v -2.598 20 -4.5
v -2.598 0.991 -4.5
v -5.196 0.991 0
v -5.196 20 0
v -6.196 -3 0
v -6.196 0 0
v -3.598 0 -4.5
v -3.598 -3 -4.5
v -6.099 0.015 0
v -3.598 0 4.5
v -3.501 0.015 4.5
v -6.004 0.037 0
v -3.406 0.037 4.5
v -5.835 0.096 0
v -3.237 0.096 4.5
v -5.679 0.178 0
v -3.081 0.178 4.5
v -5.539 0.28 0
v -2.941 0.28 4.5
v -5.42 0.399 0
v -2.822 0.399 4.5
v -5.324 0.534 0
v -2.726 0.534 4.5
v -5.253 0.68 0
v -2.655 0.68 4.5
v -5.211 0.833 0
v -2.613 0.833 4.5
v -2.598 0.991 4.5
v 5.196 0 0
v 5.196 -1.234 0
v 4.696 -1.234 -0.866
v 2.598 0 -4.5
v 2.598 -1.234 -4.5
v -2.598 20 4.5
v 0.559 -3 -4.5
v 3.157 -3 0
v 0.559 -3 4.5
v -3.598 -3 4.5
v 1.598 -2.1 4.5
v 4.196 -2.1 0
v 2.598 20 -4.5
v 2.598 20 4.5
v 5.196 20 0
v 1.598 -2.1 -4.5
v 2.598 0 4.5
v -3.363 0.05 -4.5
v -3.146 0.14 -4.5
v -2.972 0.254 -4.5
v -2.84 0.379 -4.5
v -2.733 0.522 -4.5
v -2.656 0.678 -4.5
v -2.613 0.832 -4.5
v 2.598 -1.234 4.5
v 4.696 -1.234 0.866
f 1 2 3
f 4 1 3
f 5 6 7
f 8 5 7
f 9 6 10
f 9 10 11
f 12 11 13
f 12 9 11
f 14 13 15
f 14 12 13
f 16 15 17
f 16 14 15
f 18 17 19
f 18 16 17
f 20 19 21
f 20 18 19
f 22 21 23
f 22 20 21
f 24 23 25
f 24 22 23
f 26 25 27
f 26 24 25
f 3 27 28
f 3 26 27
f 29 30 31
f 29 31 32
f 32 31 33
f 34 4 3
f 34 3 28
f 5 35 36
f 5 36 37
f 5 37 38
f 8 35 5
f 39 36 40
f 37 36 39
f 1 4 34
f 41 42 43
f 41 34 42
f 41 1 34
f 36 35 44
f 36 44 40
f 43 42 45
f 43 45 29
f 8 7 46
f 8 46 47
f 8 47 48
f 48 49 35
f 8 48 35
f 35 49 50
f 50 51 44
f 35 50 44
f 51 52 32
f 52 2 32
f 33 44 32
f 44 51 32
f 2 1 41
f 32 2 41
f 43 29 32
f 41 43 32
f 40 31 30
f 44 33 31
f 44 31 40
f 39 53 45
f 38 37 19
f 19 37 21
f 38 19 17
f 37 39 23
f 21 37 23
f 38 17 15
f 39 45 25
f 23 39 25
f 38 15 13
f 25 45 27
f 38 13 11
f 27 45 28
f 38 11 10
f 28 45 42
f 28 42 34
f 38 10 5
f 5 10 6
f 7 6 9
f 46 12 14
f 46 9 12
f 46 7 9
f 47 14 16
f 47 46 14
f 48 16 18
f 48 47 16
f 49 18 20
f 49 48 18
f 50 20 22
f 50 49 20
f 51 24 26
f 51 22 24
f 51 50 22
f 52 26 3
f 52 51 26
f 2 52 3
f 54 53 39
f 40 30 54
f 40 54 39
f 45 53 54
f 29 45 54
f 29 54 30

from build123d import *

# Parameters (mm, degrees)
EXTRUDE_1_DEPTH = 20
EXTRUDE_2_DEPTH = 3
CHAMFER_1_SIZE  = 2.1
CHAMFER_2_SIZE  = 0.9
FILLET_2_R      = 1


# Some blends are built 0.0001 mm under size
with BuildPart() as part:
    # 草图1 → 凸台-拉伸1 (new body)
    with BuildSketch(Plane(origin=(0, 0, 0), x_dir=(1, 0, 0), z_dir=(0, 1, 0))):
        Polygon((2.598076211, -4.5), (5.196152423, 0), (2.598076211, 4.5), (-2.598076211, 4.5), (-5.196152423, 0), (-2.598076211, -4.5), align=None)
    extrude(amount=EXTRUDE_1_DEPTH)

    # 草图2 → 凸台-拉伸2 (add)
    with BuildSketch(Plane(origin=(0, 0, 0), x_dir=(-1, 0, 0), z_dir=(0, -1, 0))):
        Polygon((6.196152423, 0), (3.598076211, 4.5), (-1.598076211, 4.5), (-4.196152423, 0), (-1.598076211, -4.5), (3.598076211, -4.5), align=None)
    extrude(amount=EXTRUDE_2_DEPTH)

    # 倒角1
    # the kernel refuses this chamfer: 2.1 mm, written as the material it adds along each edge
    with BuildSketch(Plane(origin=(-1.102190926, 0, -9.176999876), x_dir=(0.8656979742248804, 0.027495876610586372, -0.49981095845564816), z_dir=(0.49999999999999983, 0, 0.8660254037844388))) as chamfer_1_piece_1_section:
        Polygon((CHAMFER_1_SIZE * 0.999621916911, -CHAMFER_1_SIZE * 0.0274958766106), (-CHAMFER_1_SIZE * 0.0274958766106, -CHAMFER_1_SIZE * 0.999621916911), (0, 0), align=None)
    chamfer_1_piece_1 = extrude(amount=15.997220972, mode=Mode.PRIVATE)
    chamfer_1_piece_1 = split(chamfer_1_piece_1, bisect_by=Plane(origin=(3.647114317, -0.87342855, -2.683012702), z_dir=(-0.8660254037844421, 0, 0.49999999999999406)), keep=Keep.TOP, mode=Mode.PRIVATE)
    chamfer_1_piece_1 = split(chamfer_1_piece_1, bisect_by=Plane(origin=(3.19992905, -0.87342855, -4.5), z_dir=(0, 0, 1)), keep=Keep.TOP, mode=Mode.PRIVATE)
    chamfer_1_piece_1 = split(chamfer_1_piece_1, bisect_by=Plane(origin=(4.997078842, -0.87342855, -1.387245251), z_dir=(-0.8660254037844387, 0, -0.5000000000000003)), keep=Keep.TOP, mode=Mode.PRIVATE)
    add(chamfer_1_piece_1)
    with BuildSketch(Plane(origin=(6.89641956, 0, -4.676999876), x_dir=(0.8656979742248802, 0.027495876610586358, 0.49981095845564866), z_dir=(-0.5000000000000003, 0, 0.8660254037844386))) as chamfer_1_piece_2_section:
        Polygon((CHAMFER_1_SIZE * 0.999621916911, -CHAMFER_1_SIZE * 0.0274958766106), (-CHAMFER_1_SIZE * 0.0274958766106, -CHAMFER_1_SIZE * 0.999621916911), (0, 0), align=None)
    chamfer_1_piece_2 = extrude(amount=15.997220972, mode=Mode.PRIVATE)
    chamfer_1_piece_2 = split(chamfer_1_piece_2, bisect_by=Plane(origin=(3.647114317, -0.87342855, 2.683012702), z_dir=(-0.8660254037844353, 0, -0.500000000000006)), keep=Keep.TOP, mode=Mode.PRIVATE)
    chamfer_1_piece_2 = split(chamfer_1_piece_2, bisect_by=Plane(origin=(3.19992905, -0.87342855, 4.5), z_dir=(0, 0, -1)), keep=Keep.TOP, mode=Mode.PRIVATE)
    chamfer_1_piece_2 = split(chamfer_1_piece_2, bisect_by=Plane(origin=(4.997078842, -0.87342855, 1.387245251), z_dir=(-0.8660254037844388, 0, 0.49999999999999983)), keep=Keep.TOP, mode=Mode.PRIVATE)
    add(chamfer_1_piece_2)
    with BuildSketch(Plane(origin=(6.89641956, 0, -4.676999876), x_dir=(0.8656979742248802, 0.027495876610586358, 0.49981095845564866), z_dir=(-0.5000000000000003, 0, 0.8660254037844386))) as chamfer_1_piece_3a_section:
        Polygon((CHAMFER_1_SIZE * 0.999621916911, -CHAMFER_1_SIZE * 0.0274958766106), (-CHAMFER_1_SIZE * 0.0274958766106, -CHAMFER_1_SIZE * 0.999621916911), (0, 0), align=None)
    chamfer_1_piece_3a = extrude(amount=15.997220972, mode=Mode.PRIVATE)
    chamfer_1_piece_3a = split(chamfer_1_piece_3a, bisect_by=Plane(origin=(5.090413844, -0.863604647, 0.183144591), z_dir=(-0.8660254037844353, 0, -0.500000000000006)), keep=Keep.TOP, mode=Mode.PRIVATE)
    chamfer_1_piece_3a = split(chamfer_1_piece_3a, bisect_by=Plane(origin=(5.032629581, -0.863604647, -0.28322987), z_dir=(-0.8660254037844421, 0, 0.49999999999999406)), keep=Keep.TOP, mode=Mode.PRIVATE)
    chamfer_1_piece_3a = split(chamfer_1_piece_3a, bisect_by=Plane(origin=(4.282629581, -0.863604647, 0.149782832), z_dir=(0.8660254037844388, 0, -0.49999999999999983)), keep=Keep.TOP, mode=Mode.PRIVATE)
    with BuildSketch(Plane(origin=(-1.102190926, 0, -9.176999876), x_dir=(0.8656979742248804, 0.027495876610586372, -0.49981095845564816), z_dir=(0.49999999999999983, 0, 0.8660254037844388))) as chamfer_1_piece_3b_section:
        Polygon((CHAMFER_1_SIZE * 0.999621916911, -CHAMFER_1_SIZE * 0.0274958766106), (-CHAMFER_1_SIZE * 0.0274958766106, -CHAMFER_1_SIZE * 0.999621916911), (0, 0), align=None)
    chamfer_1_piece_3b = extrude(amount=15.997220972, mode=Mode.PRIVATE)
    chamfer_1_piece_3b = split(chamfer_1_piece_3b, bisect_by=Plane(origin=(5.032629581, -0.863604647, 0.28322987), z_dir=(-0.8660254037844353, 0, -0.500000000000006)), keep=Keep.TOP, mode=Mode.PRIVATE)
    chamfer_1_piece_3b = split(chamfer_1_piece_3b, bisect_by=Plane(origin=(5.090413844, -0.863604647, -0.183144591), z_dir=(-0.8660254037844421, 0, 0.49999999999999406)), keep=Keep.TOP, mode=Mode.PRIVATE)
    chamfer_1_piece_3b = split(chamfer_1_piece_3b, bisect_by=Plane(origin=(4.282629581, -0.863604647, -0.149782832), z_dir=(0.8660254037844387, 0, 0.5000000000000003)), keep=Keep.TOP, mode=Mode.PRIVATE)
    chamfer_1_piece_3 = chamfer_1_piece_3a & chamfer_1_piece_3b
    add(chamfer_1_piece_3)

    # 倒角2
    chamfer_2_edges = [part.edges().sort_by_distance(p)[0] for p in [
        (2.897114317, -3, 2.25),
        (2.897114317, -3, -2.25),
    ]]
    chamfer(chamfer_2_edges, length=CHAMFER_2_SIZE - 0.0001)  # a hair under: the kernel refuses the full size

    # 圆角2
    # the kernel refuses this fillet: 1 mm, written as the material it adds along each edge
    with BuildSketch(Plane(origin=(-1.359345253, 0, -6.645544957), x_dir=(-0.8660254037844353, 5.384295521873835e-15, -0.500000000000006), z_dir=(-0.500000000000006, 0, 0.8660254037844353))) as fillet_2_piece_1_section:
        with BuildLine():
            CenterArc((1, -0.990984767), FILLET_2_R, 97.699329946, 82.300670054)
            Line((0, -0.990984767), (-0.02, -0.990984767))
            Line((-0.02, -0.990984767), (-0.02, 0))
            Line((-0.02, 0), (0, 0.02))
            ThreePointArc((0, 0.02), (0.433012702, 0.02), (0.863345912, 0.019819695))
            Line((0.863345912, 0.019819695), (0.866025404, 0))
        make_face()
    fillet_2_piece_1 = extrude(amount=10.151076256, mode=Mode.PRIVATE)
    fillet_2_piece_1 = split(fillet_2_piece_1, bisect_by=Plane(origin=(-4.072160792, 0.234330223, -4.5), z_dir=(0, 0, 1)), keep=Keep.TOP, mode=Mode.PRIVATE)
    fillet_2_piece_1 = split(fillet_2_piece_1, bisect_by=Plane(origin=(-5.933194713, 0.234330223, -1.276594694), z_dir=(0.8660254037844423, 0, -0.49999999999999395)), keep=Keep.TOP, mode=Mode.PRIVATE)
    add(fillet_2_piece_1)
    with BuildSketch(Plane(origin=(-6.434883381, 0, -2.145544957), x_dir=(-0.8660254037844421, 5.3842955218737e-15, 0.4999999999999939), z_dir=(0.49999999999999395, 0, 0.8660254037844423))) as fillet_2_piece_2_section:
        with BuildLine():
            CenterArc((1, -0.990984767), FILLET_2_R, 97.699329946, 82.300670054)
            Line((0, -0.990984767), (-0.02, -0.990984767))
            Line((-0.02, -0.990984767), (-0.02, 0))
            Line((-0.02, 0), (0, 0.02))
            ThreePointArc((0, 0.02), (0.433012702, 0.02), (0.863345912, 0.019819695))
            Line((0.863345912, 0.019819695), (0.866025404, 0))
        make_face()
    fillet_2_piece_2 = extrude(amount=10.151076256, mode=Mode.PRIVATE)
    fillet_2_piece_2 = split(fillet_2_piece_2, bisect_by=Plane(origin=(-4.072160792, 0.234330223, 4.5), z_dir=(0, 0, -1)), keep=Keep.TOP, mode=Mode.PRIVATE)
    fillet_2_piece_2 = split(fillet_2_piece_2, bisect_by=Plane(origin=(-5.933194713, 0.234330223, 1.276594694), z_dir=(0.8660254037844353, 0, 0.500000000000006)), keep=Keep.TOP, mode=Mode.PRIVATE)
    add(fillet_2_piece_2)
    with BuildSketch(Plane(origin=(-6.434883381, 0, -2.145544957), x_dir=(-0.8660254037844421, 5.3842955218737e-15, 0.4999999999999939), z_dir=(0.49999999999999395, 0, 0.8660254037844423))) as fillet_2_piece_3a_section:
        with BuildLine():
            CenterArc((1, -0.990984767), FILLET_2_R, 97.699329946, 82.300670054)
            Line((0, -0.990984767), (-0.02, -0.990984767))
            Line((-0.02, -0.990984767), (-0.02, 0))
            Line((-0.02, 0), (0, 0.02))
            ThreePointArc((0, 0.02), (0.433012702, 0.02), (0.863345912, 0.019819695))
            Line((0.863345912, 0.019819695), (0.866025404, 0))
        make_face()
    fillet_2_piece_3a = extrude(amount=10.151076256, mode=Mode.PRIVATE)
    fillet_2_piece_3a = split(fillet_2_piece_3a, bisect_by=Plane(origin=(-5.943047398, 0.228517216, -0.438390763), z_dir=(0.8660254037844385, 0, 0.5000000000000004)), keep=Keep.TOP, mode=Mode.PRIVATE)
    fillet_2_piece_3a = split(fillet_2_piece_3a, bisect_by=Plane(origin=(-5.193047398, 0.228517216, -0.005378061), z_dir=(-0.8660254037844353, 0, -0.500000000000006)), keep=Keep.TOP, mode=Mode.PRIVATE)
    with BuildSketch(Plane(origin=(-1.359345253, 0, -6.645544957), x_dir=(-0.8660254037844353, 5.384295521873835e-15, -0.500000000000006), z_dir=(-0.500000000000006, 0, 0.8660254037844353))) as fillet_2_piece_3b_section:
        with BuildLine():
            CenterArc((1, -0.990984767), FILLET_2_R, 97.699329946, 82.300670054)
            Line((0, -0.990984767), (-0.02, -0.990984767))
            Line((-0.02, -0.990984767), (-0.02, 0))
            Line((-0.02, 0), (0, 0.02))
            ThreePointArc((0, 0.02), (0.433012702, 0.02), (0.863345912, 0.019819695))
            Line((0.863345912, 0.019819695), (0.866025404, 0))
        make_face()
    fillet_2_piece_3b = extrude(amount=10.151076256, mode=Mode.PRIVATE)
    fillet_2_piece_3b = split(fillet_2_piece_3b, bisect_by=Plane(origin=(-5.943047398, 0.228517216, 0.438390763), z_dir=(0.8660254037844388, 0, -0.49999999999999967)), keep=Keep.TOP, mode=Mode.PRIVATE)
    fillet_2_piece_3b = split(fillet_2_piece_3b, bisect_by=Plane(origin=(-5.193047398, 0.228517216, 0.005378061), z_dir=(-0.8660254037844423, 0, 0.49999999999999395)), keep=Keep.TOP, mode=Mode.PRIVATE)
    fillet_2_piece_3 = fillet_2_piece_3a & fillet_2_piece_3b
    add(fillet_2_piece_3)


solid = part.part
